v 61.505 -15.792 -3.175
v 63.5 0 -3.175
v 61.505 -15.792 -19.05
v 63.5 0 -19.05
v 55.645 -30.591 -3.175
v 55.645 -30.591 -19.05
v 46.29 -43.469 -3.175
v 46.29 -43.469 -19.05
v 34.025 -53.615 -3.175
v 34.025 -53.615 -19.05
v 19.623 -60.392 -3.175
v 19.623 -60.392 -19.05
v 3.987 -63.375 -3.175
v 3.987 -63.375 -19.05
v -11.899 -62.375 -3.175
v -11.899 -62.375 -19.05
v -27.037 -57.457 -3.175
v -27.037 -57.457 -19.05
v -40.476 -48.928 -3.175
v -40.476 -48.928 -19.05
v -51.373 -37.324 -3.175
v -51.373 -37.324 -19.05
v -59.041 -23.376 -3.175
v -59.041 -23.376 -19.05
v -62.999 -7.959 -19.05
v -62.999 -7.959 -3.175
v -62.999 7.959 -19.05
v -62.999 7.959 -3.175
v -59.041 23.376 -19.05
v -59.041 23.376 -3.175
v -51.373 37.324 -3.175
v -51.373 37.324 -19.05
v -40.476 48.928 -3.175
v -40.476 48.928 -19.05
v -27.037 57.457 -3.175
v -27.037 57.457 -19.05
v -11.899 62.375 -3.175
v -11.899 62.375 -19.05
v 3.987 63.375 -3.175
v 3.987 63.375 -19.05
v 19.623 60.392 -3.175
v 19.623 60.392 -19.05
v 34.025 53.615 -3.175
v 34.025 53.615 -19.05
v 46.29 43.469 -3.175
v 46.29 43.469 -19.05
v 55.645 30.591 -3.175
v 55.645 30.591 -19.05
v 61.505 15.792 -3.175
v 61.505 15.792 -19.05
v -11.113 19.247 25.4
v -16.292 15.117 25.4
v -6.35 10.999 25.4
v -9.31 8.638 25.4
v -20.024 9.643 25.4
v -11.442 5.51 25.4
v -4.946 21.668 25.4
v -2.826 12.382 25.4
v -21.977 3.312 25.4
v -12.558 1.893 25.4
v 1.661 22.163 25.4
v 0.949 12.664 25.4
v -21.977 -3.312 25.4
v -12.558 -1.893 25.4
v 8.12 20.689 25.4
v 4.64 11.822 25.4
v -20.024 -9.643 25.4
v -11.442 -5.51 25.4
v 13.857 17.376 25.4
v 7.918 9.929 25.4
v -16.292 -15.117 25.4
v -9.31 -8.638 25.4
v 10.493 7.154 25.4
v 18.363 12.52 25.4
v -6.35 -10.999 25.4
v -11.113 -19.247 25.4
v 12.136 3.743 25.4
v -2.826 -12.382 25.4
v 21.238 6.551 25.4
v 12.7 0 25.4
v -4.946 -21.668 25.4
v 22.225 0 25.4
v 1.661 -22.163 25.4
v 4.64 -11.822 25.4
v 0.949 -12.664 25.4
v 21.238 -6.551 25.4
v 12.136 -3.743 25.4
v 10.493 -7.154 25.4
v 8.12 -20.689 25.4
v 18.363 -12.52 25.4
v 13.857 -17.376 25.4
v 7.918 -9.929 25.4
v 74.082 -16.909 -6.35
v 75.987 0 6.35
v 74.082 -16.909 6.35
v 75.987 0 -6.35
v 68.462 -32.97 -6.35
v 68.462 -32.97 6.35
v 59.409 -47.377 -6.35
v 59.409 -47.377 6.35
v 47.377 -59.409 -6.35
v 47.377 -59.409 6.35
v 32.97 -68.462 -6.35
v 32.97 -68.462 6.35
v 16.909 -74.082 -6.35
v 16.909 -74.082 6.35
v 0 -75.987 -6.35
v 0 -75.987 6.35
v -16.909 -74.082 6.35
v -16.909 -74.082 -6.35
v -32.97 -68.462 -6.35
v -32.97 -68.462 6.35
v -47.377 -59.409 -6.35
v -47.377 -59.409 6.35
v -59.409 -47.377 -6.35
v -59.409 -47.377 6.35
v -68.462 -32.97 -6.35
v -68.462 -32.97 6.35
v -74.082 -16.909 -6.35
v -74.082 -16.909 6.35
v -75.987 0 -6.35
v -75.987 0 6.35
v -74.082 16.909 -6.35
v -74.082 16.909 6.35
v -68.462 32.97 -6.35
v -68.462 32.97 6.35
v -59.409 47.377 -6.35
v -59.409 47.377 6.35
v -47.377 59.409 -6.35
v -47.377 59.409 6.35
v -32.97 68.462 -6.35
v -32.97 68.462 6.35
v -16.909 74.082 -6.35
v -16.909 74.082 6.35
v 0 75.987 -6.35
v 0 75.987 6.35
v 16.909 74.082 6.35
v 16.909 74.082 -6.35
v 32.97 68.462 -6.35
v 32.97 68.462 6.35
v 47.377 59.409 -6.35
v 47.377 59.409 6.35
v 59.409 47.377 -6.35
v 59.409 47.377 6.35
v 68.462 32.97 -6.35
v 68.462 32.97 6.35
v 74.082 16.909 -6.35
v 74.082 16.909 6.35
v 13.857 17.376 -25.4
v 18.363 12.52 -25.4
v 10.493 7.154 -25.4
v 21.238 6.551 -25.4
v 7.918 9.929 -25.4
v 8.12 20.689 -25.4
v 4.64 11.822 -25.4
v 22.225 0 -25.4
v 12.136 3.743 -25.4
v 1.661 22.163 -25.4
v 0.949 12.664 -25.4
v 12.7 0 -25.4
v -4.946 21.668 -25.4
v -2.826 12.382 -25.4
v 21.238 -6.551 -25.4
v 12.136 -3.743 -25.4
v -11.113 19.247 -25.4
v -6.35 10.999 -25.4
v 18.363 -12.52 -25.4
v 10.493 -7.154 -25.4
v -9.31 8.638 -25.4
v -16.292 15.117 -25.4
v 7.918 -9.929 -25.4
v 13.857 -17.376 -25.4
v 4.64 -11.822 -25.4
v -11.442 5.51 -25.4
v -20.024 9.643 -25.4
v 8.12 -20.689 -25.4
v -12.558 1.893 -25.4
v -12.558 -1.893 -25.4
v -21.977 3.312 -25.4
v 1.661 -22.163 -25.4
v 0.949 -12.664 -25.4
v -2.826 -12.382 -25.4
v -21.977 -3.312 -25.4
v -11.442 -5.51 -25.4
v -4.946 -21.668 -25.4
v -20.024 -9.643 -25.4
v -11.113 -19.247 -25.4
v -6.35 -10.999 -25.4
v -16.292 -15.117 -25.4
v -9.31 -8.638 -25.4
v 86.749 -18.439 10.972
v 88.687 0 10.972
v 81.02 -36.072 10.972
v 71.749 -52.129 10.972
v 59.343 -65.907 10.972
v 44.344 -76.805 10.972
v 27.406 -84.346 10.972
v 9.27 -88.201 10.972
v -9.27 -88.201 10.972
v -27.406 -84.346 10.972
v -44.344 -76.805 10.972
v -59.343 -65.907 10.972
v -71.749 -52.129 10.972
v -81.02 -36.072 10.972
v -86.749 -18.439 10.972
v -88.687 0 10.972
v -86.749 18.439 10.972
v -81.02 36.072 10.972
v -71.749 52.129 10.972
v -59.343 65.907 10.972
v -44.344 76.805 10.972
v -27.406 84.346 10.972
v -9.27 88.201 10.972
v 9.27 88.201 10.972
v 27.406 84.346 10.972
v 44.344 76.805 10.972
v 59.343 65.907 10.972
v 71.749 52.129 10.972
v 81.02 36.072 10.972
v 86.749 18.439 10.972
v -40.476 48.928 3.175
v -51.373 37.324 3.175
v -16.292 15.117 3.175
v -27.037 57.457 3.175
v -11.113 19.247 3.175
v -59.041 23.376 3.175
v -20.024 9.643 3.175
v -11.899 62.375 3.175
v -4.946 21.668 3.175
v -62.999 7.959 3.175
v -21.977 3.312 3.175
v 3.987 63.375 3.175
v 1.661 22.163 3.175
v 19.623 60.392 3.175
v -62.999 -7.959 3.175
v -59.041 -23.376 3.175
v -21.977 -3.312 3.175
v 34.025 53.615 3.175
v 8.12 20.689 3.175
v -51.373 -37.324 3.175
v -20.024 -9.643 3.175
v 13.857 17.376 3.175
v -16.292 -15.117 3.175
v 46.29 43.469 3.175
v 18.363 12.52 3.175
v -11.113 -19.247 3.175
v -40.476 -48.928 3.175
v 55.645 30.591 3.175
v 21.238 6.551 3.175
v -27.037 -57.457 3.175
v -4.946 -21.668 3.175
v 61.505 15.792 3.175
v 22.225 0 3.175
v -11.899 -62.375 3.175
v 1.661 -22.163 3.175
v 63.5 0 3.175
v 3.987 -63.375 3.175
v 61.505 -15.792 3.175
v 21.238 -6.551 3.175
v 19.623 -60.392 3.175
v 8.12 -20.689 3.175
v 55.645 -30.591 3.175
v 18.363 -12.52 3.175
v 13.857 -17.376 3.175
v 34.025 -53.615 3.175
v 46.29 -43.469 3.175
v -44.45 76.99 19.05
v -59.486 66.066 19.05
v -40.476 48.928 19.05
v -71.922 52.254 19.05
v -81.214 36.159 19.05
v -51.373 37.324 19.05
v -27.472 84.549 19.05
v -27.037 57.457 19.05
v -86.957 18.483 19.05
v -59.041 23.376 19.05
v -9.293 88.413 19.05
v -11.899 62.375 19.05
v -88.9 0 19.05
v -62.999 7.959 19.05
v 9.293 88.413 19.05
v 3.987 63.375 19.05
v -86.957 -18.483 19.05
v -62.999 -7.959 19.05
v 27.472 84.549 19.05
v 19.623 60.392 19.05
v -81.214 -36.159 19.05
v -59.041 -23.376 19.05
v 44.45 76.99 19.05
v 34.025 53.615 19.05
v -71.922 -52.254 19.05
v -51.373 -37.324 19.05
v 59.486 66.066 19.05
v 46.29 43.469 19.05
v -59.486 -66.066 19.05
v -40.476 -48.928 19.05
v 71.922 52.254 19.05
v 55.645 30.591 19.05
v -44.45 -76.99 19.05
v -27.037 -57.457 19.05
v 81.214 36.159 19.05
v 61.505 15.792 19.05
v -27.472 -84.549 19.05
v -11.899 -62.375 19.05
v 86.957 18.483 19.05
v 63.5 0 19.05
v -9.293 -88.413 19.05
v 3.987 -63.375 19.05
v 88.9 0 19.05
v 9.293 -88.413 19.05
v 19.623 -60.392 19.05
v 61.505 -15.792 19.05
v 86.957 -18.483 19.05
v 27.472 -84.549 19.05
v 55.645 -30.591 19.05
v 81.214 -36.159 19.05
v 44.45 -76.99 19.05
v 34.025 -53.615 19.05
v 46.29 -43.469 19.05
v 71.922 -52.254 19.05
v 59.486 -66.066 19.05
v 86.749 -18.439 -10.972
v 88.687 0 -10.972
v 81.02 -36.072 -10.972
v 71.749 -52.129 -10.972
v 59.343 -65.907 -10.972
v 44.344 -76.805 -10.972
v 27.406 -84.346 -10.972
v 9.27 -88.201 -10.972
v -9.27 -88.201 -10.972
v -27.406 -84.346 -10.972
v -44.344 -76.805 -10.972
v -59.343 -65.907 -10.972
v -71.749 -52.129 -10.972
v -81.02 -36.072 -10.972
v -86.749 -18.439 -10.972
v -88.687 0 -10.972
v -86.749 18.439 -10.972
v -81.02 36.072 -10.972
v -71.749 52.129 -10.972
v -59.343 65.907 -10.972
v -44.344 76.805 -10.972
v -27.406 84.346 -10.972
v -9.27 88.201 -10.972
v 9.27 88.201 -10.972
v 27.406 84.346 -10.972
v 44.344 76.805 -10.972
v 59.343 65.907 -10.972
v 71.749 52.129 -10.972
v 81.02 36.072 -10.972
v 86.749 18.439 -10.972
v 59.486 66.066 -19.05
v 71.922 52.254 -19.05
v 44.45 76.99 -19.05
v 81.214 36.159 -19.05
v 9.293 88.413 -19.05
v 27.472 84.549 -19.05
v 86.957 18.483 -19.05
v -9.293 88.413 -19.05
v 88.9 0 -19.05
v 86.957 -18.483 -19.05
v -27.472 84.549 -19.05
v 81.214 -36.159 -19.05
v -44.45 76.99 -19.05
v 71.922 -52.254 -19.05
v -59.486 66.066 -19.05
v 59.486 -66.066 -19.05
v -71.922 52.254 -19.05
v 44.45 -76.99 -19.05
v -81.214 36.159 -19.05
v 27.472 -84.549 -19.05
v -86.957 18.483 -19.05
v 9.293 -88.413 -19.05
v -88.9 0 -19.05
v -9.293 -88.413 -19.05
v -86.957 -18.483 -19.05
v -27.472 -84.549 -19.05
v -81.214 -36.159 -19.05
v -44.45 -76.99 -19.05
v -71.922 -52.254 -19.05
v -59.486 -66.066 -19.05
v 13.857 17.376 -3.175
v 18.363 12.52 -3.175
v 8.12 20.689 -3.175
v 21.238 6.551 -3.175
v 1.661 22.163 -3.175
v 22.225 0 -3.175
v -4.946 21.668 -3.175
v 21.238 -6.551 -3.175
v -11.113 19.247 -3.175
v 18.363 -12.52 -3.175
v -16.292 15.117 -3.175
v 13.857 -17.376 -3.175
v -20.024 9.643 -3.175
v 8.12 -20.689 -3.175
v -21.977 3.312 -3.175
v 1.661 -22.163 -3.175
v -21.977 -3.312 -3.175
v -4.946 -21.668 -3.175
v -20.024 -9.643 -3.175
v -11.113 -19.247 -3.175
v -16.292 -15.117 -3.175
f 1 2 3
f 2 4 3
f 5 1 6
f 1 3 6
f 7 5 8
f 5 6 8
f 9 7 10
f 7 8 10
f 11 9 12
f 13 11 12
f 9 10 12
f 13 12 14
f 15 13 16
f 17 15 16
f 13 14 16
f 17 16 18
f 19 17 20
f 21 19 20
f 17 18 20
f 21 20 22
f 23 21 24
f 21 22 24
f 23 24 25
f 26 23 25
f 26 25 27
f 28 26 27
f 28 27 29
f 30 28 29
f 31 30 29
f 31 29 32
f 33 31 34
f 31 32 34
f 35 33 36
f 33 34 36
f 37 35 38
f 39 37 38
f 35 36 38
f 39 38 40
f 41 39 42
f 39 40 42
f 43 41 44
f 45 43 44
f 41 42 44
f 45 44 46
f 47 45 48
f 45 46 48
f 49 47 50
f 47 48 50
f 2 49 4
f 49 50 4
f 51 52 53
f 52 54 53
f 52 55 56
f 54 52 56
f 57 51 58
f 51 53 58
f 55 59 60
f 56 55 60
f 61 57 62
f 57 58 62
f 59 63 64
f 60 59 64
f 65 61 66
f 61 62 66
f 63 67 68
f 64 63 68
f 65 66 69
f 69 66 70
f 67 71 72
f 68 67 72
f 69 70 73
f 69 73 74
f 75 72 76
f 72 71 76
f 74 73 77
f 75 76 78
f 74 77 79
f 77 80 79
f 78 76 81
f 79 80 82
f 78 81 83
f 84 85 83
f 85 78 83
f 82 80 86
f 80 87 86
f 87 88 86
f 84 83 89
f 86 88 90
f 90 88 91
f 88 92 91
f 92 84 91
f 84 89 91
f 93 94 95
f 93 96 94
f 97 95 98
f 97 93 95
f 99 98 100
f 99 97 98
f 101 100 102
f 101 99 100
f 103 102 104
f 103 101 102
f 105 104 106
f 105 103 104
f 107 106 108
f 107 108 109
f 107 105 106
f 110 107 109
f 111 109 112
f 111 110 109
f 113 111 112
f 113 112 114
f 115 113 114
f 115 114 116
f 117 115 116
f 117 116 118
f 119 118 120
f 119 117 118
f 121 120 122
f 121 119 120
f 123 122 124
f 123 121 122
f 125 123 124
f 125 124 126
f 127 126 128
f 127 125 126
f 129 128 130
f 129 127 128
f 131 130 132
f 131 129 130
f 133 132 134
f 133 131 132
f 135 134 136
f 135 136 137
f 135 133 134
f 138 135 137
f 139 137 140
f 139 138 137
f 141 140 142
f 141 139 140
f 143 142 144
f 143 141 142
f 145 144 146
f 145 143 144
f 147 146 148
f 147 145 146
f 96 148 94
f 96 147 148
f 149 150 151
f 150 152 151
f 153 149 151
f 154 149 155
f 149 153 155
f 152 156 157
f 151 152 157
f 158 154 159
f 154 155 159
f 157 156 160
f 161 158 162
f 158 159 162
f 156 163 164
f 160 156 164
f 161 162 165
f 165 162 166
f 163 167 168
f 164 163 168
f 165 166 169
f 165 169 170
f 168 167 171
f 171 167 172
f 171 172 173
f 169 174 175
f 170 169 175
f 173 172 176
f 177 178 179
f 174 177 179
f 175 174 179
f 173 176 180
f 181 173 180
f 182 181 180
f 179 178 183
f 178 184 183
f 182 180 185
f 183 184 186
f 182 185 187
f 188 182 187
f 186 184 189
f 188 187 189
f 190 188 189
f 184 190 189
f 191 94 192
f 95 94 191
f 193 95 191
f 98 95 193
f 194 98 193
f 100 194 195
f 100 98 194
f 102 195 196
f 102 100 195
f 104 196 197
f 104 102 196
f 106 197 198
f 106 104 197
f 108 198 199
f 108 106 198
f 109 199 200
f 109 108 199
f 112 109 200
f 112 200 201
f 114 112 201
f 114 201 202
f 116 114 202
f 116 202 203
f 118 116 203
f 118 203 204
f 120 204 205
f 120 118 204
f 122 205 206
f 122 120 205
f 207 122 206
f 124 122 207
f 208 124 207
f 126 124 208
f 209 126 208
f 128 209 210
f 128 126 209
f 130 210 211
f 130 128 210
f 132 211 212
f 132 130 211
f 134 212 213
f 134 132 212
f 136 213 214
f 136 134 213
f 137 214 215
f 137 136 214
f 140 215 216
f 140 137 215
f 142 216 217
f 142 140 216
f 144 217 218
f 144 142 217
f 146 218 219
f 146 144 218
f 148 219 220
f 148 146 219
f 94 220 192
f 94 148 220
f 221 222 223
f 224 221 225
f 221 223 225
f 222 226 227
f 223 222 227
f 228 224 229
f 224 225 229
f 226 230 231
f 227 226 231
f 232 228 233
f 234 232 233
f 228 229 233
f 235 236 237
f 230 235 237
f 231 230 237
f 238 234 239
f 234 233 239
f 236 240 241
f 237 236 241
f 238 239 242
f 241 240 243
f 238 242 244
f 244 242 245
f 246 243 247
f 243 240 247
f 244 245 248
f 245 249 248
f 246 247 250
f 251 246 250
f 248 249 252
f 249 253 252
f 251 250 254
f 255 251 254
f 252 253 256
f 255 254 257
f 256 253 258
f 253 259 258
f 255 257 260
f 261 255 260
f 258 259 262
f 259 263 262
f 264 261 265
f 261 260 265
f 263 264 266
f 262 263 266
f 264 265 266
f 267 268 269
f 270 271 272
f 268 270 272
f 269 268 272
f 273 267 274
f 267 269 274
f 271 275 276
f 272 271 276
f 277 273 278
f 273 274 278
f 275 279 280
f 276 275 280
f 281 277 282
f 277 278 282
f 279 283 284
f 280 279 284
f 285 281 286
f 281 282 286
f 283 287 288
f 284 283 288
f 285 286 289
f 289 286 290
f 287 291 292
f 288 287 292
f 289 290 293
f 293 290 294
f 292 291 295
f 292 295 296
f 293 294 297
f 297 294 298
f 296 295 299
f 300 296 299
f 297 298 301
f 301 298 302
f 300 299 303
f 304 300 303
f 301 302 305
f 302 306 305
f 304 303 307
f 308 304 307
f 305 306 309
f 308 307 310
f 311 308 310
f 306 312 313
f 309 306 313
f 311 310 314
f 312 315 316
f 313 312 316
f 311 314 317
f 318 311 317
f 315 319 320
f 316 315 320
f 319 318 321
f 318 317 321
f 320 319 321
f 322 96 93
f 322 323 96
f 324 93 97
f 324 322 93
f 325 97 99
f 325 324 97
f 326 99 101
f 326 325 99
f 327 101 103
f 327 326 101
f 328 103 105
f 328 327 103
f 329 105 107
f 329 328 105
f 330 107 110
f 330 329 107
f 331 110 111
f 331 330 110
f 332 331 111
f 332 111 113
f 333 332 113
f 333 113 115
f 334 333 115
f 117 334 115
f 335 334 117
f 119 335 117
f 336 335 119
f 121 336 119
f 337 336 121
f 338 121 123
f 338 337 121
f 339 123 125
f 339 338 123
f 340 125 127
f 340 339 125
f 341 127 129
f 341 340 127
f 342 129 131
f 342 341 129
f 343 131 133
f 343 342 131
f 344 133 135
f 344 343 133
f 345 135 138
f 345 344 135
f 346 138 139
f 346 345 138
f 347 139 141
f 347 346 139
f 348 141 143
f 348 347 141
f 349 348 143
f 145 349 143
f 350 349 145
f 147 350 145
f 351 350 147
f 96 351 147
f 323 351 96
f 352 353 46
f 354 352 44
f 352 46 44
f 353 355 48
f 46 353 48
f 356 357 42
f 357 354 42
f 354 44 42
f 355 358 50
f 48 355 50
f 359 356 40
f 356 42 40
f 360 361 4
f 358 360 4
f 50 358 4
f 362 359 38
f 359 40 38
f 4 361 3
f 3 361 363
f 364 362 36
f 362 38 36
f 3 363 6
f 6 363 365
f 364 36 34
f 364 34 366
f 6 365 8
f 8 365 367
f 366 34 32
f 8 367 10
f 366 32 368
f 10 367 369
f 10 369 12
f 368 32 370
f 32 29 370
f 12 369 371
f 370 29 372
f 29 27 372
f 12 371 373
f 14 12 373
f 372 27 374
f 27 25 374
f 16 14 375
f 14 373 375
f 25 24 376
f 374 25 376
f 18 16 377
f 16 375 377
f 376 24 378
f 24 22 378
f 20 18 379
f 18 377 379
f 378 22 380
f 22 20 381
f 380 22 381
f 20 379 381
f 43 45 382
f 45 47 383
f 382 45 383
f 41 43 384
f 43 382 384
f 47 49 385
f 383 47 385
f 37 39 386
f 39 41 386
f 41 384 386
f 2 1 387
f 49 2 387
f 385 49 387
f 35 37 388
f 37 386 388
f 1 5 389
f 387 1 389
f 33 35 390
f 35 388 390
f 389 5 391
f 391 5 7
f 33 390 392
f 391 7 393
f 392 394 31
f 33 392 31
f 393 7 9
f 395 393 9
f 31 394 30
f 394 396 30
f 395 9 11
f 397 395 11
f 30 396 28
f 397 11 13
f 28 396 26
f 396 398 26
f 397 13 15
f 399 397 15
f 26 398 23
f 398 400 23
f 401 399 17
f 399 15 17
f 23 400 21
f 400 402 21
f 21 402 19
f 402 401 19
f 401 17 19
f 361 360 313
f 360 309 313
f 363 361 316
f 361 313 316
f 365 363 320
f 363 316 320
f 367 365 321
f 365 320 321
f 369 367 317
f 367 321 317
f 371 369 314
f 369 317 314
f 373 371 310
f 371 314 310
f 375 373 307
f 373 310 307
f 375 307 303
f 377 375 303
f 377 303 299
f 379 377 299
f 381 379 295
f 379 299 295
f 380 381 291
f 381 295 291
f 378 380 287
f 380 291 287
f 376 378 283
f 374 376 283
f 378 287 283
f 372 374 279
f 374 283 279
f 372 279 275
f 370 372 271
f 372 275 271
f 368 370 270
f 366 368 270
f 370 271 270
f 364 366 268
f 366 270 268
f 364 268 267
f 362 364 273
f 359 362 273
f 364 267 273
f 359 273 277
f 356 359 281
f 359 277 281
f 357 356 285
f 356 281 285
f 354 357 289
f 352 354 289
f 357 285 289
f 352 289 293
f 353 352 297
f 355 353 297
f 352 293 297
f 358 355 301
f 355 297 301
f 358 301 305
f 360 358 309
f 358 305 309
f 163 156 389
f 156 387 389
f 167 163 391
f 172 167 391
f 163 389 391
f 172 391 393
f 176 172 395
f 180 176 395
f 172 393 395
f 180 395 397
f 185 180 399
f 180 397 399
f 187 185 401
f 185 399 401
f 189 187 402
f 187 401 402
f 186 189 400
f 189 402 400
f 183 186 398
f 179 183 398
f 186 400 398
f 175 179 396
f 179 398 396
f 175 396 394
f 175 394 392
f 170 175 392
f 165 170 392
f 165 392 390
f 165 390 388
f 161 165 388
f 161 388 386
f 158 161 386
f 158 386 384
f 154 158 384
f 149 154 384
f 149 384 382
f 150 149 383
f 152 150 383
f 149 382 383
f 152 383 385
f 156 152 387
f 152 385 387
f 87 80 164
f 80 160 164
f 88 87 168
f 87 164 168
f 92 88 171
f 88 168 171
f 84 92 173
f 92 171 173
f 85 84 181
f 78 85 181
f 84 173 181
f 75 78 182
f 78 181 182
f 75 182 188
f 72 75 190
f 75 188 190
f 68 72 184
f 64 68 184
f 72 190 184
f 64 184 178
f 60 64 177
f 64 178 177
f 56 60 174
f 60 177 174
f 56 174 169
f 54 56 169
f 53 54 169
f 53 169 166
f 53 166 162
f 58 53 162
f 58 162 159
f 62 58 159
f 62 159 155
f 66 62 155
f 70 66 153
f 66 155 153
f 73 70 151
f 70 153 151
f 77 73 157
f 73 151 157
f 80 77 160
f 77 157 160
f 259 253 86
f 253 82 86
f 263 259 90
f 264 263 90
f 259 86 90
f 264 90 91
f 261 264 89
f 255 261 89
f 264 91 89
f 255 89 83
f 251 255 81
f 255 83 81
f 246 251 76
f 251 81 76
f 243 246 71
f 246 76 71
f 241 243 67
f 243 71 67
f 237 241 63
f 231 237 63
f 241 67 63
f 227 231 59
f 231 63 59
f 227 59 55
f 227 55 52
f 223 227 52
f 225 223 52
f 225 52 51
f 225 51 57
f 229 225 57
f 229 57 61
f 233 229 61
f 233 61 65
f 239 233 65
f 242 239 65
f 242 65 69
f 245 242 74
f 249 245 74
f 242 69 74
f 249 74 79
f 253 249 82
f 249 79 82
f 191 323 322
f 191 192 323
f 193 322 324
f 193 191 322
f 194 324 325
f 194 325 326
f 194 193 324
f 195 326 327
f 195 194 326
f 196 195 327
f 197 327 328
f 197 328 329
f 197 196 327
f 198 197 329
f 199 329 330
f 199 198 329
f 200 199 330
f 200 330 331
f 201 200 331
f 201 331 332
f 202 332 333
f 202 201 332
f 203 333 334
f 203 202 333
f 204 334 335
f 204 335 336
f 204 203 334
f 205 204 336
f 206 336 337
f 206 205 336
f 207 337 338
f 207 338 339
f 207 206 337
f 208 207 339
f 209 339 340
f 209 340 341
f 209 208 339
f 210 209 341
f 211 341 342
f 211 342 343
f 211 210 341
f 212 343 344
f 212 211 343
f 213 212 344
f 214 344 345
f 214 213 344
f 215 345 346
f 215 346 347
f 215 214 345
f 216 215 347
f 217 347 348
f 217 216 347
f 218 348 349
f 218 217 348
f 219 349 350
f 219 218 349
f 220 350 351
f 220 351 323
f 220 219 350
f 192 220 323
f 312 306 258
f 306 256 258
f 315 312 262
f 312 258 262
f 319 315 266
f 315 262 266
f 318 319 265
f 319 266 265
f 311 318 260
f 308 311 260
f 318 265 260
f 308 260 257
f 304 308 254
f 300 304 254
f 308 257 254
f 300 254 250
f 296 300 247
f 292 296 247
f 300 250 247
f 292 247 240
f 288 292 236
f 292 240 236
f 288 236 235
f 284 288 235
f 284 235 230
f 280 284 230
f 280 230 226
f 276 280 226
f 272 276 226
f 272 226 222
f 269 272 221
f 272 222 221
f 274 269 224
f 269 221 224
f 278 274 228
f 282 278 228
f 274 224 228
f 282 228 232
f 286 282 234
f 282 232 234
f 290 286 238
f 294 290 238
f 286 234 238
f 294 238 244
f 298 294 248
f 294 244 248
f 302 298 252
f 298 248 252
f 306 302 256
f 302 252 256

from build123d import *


with BuildPart() as part:
    # Sketch1 → Revolve2 (revolve)
    with BuildSketch(Plane(origin=(0, 0, 0), x_dir=(0, 0, -1), z_dir=(1, 0, 0)), mode=Mode.PRIVATE) as revolve2_sk:
        Polygon((-25.4, 12.7), (25.4, 12.7), (25.4, 22.225), (3.175, 22.225), (3.175, 63.5), (19.05, 63.5), (19.05, 88.9), (-19.05, 88.9), (-19.05, 63.5), (-3.175, 63.5), (-3.175, 22.225), (-25.4, 22.225), align=None)
    revolve(revolve2_sk.sketch.rotate(Axis((0, 0, 0), (0, 0, -1)), 90), axis=Axis((0, 0, 0), (0, 0, -1)))

    # Sketch2 → Cut-Revolve1 (revolve, cut)
    with BuildSketch(Plane(origin=(0, 0, 0), x_dir=(0, 0, -1), z_dir=(1, 0, 0)), mode=Mode.PRIVATE) as cut_revolve1_sk:
        Polygon((-10.972421975, 88.687029024), (-6.35, 75.987029024), (6.35, 75.987029024), (10.972421975, 88.687029024), align=None)
    revolve(cut_revolve1_sk.sketch.rotate(Axis((0, 0, 0), (0, 0, -1)), 90), axis=Axis((0, 0, 0), (0, 0, -1)), mode=Mode.SUBTRACT)


solid = part.part
